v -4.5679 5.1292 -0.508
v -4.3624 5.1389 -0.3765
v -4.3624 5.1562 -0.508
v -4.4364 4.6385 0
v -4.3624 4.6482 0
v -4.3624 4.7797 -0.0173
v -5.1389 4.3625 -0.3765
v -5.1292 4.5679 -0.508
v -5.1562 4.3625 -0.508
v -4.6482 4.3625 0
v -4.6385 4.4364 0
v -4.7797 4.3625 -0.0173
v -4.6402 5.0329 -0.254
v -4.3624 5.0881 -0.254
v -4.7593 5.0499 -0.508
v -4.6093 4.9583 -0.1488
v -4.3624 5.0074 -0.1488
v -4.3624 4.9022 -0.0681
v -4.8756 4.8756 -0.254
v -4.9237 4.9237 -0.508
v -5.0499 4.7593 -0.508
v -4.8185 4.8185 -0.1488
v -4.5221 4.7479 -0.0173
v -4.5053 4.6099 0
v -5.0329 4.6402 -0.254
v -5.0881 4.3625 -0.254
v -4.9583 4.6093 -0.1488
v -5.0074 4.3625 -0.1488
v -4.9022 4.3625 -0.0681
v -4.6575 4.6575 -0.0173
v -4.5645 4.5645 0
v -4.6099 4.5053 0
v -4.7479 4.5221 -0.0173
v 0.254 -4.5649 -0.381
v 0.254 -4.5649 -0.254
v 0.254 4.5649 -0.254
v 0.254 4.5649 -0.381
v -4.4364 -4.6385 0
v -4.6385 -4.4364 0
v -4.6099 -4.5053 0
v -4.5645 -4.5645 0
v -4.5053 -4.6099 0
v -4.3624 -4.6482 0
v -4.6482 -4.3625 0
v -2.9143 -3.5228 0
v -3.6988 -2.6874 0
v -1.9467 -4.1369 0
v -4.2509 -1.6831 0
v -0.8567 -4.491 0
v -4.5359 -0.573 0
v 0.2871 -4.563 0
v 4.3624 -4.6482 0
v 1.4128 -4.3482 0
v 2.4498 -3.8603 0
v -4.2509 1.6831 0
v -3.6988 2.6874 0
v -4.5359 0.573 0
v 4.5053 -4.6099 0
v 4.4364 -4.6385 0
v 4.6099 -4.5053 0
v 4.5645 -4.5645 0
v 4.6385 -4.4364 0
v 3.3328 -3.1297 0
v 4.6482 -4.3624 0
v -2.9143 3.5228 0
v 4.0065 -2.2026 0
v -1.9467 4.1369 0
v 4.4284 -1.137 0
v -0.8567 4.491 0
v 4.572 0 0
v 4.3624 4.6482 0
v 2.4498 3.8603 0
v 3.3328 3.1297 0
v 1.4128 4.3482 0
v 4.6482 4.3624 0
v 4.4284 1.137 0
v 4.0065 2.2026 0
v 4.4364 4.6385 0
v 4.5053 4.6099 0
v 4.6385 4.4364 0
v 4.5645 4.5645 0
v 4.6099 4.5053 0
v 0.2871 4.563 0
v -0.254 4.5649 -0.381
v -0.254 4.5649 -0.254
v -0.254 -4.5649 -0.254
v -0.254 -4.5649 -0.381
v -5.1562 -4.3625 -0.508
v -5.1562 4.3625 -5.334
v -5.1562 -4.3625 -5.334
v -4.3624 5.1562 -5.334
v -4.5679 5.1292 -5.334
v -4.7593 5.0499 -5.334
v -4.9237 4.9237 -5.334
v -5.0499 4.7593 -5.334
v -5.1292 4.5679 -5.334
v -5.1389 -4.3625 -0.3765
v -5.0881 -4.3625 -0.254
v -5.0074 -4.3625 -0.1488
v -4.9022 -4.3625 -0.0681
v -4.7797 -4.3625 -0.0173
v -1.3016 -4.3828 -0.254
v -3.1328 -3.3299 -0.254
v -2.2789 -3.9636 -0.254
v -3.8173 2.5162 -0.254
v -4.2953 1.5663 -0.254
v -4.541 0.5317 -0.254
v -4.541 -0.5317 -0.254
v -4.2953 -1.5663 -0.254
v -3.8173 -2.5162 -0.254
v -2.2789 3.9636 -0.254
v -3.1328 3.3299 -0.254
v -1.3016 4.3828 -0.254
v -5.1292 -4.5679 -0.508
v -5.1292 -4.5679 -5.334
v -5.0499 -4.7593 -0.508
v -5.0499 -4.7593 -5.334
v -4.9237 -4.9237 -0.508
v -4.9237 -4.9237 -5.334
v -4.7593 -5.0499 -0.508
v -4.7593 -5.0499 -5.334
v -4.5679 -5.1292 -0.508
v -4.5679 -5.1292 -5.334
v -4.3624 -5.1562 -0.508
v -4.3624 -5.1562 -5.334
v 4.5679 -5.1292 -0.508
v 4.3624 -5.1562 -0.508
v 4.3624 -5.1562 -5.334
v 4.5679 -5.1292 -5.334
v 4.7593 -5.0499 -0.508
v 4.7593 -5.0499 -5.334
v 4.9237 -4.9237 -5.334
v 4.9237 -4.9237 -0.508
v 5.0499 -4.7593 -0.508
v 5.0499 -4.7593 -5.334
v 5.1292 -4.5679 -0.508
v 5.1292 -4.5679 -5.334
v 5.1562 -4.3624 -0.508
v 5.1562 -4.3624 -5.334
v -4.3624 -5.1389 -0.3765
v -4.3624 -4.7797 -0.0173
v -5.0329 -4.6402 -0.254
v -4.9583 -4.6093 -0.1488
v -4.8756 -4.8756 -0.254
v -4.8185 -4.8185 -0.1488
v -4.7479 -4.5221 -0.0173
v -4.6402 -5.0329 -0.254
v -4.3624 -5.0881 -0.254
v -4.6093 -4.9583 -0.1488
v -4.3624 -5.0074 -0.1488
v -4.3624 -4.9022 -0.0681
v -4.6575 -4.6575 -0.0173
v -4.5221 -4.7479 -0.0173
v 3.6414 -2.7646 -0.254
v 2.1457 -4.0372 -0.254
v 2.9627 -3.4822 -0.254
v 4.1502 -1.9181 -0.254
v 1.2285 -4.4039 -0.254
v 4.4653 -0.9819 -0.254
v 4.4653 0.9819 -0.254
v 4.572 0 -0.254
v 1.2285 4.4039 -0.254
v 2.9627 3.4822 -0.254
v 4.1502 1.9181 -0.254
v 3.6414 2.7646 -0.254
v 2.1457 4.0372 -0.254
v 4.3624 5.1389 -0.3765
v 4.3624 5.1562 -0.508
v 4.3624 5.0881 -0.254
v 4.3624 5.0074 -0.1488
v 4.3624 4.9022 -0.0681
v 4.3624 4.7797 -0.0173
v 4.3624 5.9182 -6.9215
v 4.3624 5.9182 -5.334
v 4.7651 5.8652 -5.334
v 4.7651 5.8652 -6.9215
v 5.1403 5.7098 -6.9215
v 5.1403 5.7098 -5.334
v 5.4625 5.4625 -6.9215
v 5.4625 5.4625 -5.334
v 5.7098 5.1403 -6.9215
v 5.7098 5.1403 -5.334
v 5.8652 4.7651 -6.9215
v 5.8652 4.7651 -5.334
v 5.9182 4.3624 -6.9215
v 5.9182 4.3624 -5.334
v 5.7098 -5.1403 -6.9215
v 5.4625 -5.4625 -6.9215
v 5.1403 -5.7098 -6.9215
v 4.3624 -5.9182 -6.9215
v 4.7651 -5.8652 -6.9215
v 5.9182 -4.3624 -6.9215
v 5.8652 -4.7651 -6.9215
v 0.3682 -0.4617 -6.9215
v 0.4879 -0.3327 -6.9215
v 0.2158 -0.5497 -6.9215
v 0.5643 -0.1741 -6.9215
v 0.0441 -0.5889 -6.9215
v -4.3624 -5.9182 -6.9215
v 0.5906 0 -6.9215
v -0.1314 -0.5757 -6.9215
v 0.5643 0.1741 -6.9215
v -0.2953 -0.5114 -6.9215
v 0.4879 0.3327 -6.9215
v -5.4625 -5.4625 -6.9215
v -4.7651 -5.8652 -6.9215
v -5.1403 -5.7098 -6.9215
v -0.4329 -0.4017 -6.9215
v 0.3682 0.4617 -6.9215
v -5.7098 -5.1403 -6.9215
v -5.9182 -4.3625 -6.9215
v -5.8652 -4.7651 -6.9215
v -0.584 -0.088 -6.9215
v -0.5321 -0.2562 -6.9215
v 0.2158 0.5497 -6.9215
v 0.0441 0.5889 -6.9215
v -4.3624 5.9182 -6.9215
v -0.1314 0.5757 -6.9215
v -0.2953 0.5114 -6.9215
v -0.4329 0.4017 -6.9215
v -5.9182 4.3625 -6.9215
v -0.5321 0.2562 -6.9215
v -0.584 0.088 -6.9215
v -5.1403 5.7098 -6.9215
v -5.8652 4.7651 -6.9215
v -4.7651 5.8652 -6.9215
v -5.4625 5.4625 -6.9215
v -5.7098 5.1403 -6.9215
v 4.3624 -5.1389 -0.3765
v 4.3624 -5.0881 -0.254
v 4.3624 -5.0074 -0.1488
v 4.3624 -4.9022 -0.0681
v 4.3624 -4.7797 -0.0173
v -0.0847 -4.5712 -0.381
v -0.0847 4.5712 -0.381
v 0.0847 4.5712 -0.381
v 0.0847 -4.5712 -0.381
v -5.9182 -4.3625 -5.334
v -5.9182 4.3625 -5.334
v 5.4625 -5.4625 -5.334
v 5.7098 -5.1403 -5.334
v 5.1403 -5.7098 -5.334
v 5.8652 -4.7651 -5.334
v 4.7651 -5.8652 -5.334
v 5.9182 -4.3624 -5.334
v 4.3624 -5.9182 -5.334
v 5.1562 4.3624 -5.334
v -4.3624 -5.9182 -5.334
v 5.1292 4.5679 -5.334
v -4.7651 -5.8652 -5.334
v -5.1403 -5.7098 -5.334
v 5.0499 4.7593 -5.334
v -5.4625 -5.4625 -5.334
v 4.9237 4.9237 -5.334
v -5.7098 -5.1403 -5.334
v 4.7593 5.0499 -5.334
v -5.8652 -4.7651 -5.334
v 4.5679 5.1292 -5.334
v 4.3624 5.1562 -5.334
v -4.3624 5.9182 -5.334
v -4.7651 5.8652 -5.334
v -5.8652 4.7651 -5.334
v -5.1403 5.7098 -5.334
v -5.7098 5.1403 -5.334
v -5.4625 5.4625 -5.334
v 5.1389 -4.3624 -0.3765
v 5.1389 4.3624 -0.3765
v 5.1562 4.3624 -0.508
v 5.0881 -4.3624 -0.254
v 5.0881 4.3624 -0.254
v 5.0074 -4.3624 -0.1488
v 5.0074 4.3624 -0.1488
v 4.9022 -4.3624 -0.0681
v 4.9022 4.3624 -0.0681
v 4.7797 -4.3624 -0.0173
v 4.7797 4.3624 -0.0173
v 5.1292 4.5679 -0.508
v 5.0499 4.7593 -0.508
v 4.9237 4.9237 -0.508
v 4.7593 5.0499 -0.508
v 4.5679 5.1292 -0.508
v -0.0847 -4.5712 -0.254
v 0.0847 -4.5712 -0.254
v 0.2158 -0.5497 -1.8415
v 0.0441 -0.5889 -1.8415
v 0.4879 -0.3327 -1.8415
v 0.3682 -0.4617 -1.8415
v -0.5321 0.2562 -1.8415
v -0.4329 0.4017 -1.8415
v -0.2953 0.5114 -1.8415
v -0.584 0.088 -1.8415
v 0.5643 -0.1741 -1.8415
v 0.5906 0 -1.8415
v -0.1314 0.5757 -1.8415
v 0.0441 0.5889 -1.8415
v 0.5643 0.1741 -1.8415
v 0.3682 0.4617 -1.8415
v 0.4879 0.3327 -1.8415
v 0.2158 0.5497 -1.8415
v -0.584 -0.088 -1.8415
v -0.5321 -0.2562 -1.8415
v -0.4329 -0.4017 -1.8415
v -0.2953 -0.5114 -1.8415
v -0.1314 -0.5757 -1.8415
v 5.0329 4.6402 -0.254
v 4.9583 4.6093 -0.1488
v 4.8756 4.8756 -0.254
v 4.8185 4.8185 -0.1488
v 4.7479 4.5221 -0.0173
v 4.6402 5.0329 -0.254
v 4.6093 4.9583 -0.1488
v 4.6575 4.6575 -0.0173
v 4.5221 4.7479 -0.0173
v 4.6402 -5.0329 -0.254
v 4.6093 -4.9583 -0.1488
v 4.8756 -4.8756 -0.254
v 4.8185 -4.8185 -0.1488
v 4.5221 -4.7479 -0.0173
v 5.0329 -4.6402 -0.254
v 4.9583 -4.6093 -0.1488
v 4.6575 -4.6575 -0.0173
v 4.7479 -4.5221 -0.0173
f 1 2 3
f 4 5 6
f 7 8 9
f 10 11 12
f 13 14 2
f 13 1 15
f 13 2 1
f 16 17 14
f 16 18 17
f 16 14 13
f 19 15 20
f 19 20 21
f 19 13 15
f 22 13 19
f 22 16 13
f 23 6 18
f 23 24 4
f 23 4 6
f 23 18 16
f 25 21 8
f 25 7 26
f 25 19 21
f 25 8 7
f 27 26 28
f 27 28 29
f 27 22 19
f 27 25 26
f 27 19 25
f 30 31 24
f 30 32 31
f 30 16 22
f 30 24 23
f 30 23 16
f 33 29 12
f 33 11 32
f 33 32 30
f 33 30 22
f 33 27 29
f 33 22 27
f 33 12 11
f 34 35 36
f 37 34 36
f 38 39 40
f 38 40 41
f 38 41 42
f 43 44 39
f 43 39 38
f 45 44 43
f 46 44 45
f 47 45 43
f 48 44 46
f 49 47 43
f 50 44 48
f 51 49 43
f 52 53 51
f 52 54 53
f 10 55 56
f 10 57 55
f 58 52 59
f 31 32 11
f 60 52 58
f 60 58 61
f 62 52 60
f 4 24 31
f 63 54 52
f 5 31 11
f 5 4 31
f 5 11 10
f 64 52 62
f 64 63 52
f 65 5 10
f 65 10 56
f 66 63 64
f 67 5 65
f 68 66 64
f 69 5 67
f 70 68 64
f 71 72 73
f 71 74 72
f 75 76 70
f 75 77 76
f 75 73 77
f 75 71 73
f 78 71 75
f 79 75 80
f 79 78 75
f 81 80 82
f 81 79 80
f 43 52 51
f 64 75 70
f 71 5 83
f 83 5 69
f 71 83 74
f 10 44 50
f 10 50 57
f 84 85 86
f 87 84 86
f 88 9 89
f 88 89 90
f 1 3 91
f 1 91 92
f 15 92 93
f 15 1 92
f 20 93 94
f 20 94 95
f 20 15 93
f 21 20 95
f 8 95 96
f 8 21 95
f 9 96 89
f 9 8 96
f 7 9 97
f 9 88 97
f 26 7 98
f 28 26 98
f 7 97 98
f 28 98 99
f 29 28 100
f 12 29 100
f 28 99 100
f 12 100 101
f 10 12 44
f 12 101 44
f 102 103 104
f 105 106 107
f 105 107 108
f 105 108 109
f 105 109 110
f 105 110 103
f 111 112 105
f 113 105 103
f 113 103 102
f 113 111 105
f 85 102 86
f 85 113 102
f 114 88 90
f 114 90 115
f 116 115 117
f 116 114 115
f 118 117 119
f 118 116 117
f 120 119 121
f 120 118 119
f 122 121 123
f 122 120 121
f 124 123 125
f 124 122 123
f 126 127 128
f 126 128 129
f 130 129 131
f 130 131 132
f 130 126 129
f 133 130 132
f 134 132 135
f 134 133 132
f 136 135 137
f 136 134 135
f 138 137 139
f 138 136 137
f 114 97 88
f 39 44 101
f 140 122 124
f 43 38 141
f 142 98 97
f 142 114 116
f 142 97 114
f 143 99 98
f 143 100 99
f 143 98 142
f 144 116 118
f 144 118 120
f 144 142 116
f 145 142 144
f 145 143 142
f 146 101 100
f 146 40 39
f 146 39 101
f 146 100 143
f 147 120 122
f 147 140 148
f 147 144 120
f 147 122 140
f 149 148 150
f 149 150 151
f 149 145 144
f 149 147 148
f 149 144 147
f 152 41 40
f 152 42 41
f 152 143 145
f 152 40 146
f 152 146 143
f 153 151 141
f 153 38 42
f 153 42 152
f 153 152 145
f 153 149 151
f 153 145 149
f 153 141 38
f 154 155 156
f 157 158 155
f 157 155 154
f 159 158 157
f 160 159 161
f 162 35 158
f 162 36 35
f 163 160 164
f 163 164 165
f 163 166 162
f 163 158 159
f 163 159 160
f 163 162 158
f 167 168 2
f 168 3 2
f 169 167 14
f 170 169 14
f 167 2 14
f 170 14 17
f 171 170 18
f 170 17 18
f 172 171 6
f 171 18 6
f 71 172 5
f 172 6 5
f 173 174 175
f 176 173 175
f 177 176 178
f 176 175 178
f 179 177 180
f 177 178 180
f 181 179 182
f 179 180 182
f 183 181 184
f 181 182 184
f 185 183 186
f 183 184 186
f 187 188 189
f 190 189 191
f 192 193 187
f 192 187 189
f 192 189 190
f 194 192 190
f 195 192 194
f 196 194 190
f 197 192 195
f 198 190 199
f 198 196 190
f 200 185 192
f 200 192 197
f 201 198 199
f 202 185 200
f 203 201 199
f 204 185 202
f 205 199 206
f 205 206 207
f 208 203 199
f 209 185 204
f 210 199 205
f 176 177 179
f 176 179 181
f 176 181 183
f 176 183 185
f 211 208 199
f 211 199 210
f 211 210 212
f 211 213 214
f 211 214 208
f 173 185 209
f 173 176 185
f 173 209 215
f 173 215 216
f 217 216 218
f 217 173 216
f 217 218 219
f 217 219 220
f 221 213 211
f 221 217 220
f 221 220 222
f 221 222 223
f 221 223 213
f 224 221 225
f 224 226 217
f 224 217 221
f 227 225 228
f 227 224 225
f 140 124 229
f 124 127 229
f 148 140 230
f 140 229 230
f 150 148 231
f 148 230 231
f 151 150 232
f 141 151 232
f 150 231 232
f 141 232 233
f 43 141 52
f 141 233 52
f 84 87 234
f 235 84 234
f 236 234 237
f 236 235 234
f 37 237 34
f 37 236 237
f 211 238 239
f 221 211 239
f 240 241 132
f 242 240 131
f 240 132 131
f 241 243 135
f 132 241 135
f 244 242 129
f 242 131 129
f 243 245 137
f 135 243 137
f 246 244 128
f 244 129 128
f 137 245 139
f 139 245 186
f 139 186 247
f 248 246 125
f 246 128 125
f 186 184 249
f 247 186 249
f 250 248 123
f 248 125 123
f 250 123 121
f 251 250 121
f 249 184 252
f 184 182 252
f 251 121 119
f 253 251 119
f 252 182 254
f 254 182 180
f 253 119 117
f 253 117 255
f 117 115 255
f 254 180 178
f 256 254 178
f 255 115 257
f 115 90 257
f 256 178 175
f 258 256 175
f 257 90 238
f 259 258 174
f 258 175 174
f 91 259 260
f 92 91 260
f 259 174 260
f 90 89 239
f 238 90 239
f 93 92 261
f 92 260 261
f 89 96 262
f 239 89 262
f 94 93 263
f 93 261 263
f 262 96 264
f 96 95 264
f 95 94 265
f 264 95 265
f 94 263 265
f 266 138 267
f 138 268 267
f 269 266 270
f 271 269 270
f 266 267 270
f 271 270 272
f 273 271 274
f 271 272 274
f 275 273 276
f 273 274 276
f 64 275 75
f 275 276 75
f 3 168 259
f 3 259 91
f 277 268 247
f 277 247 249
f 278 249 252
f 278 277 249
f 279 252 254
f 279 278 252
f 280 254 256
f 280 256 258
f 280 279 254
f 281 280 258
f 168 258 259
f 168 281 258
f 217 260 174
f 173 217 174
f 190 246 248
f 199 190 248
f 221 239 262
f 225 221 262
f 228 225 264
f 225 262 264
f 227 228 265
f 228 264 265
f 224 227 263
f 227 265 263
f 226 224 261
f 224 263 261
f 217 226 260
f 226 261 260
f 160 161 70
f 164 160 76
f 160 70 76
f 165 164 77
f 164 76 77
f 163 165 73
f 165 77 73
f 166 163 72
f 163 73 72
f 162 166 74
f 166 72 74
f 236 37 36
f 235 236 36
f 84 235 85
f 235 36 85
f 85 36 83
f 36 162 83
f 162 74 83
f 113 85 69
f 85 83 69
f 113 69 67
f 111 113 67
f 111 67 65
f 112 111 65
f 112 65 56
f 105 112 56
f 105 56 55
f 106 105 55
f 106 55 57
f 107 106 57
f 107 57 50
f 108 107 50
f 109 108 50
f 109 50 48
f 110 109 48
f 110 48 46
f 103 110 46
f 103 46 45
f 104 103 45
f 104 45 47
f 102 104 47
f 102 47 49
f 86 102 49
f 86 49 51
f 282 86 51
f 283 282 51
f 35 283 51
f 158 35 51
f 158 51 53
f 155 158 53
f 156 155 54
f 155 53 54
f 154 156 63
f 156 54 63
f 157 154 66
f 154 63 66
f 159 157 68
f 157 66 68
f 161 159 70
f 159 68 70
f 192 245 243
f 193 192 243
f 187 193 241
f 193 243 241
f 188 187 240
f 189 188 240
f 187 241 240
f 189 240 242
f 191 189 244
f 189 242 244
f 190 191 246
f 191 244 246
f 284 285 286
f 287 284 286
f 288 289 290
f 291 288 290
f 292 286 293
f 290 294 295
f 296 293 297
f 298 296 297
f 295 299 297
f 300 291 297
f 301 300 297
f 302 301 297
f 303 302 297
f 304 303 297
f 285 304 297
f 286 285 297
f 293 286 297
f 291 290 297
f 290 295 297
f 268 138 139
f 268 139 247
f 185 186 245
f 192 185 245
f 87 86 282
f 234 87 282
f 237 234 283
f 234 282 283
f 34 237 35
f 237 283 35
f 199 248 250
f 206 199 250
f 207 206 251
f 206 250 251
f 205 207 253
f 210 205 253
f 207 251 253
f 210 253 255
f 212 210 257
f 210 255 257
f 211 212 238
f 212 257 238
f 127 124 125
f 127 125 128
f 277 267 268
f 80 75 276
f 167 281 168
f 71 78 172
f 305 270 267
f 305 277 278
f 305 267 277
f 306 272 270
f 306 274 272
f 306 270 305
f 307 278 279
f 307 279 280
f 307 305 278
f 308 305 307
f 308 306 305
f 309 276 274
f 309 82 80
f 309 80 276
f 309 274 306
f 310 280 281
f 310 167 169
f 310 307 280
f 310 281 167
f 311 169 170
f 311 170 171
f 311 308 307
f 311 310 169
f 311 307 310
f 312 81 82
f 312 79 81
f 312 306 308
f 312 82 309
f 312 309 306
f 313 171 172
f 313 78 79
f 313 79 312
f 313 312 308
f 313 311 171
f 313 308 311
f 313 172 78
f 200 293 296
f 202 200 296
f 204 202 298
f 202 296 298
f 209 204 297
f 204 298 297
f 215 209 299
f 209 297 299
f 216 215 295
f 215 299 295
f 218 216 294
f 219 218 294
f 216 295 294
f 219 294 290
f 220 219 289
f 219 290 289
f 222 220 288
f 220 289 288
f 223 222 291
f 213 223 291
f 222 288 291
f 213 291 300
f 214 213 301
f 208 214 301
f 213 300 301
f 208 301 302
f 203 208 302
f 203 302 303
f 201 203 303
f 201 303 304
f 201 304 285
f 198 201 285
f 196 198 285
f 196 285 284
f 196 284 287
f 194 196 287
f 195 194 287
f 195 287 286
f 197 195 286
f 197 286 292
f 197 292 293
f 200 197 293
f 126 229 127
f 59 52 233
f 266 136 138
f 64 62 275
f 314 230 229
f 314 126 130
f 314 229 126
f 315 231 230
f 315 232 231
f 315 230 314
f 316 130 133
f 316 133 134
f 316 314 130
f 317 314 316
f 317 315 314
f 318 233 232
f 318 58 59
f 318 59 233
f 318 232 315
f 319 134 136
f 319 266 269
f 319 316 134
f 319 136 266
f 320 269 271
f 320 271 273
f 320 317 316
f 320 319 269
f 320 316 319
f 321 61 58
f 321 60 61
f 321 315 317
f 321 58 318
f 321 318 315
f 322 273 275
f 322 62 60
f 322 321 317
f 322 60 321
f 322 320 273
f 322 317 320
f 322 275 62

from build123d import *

# Parameters (mm, degrees)
BOSS_EXTRUDE1_DEPTH              = 5.334
FILLET1_R                        = 0.508
SKETCH2_R                        = 4.572
CUT_EXTRUDE1_DEPTH               = 0.254
CUT_EXTRUDE2_DEPTH               = 0.127
BOSS_EXTRUDE2_DEPTH              = 1.5875
F_56_0_0465_DIAMETER_HOLE1_D     = 1.1811
F_56_0_0465_DIAMETER_HOLE1_DEPTH = 5.08


with BuildPart() as part:
    # Sketch1 → Boss-Extrude1 (new body)
    with BuildSketch(Plane.XY):
        with BuildLine():
            Line((4.362446893, 5.156199954), (-4.362446893, 5.156199954))
            ThreePointArc((-4.362446893, 5.156199954), (-4.923713797, 4.923718126), (-5.156199954, 4.362453015))
            Line((-5.156199954, 4.362453015), (-5.156199954, -4.362453015))
            ThreePointArc((-5.156199954, -4.362453015), (-4.923714856, -4.923717067), (-4.362449887, -5.156199954))
            Line((-4.362449887, -5.156199954), (4.362449887, -5.156199954))
            ThreePointArc((4.362449887, -5.156199954), (4.92371702, -4.923714903), (5.156199954, -4.362446893))
            Line((5.156199954, -4.362446893), (5.156199954, 4.362446893))
            ThreePointArc((5.156199954, 4.362446893), (4.923715961, 4.923715962), (4.362446893, 5.156199954))
        make_face()
    extrude(amount=-BOSS_EXTRUDE1_DEPTH)

    # Fillet1
    fillet1_edges = [part.edges().sort_by_distance(p)[0] for p in [
        (0, 5.156199954, 0),
        (4.923715961, 4.923715962, 0),
        (5.156199954, 0, 0),
        (4.92371702, -4.923714903, 0),
        (0, -5.156199954, 0),
        (-4.923714856, -4.923717067, 0),
        (-5.156199954, 0, 0),
        (-4.923713797, 4.923718126, 0),
    ]]
    fillet(fillet1_edges, radius=FILLET1_R)

    # Sketch2 → Cut-Extrude1 (cut)
    with BuildSketch(Plane.XY):
        Circle(SKETCH2_R)
    extrude(amount=-CUT_EXTRUDE1_DEPTH, mode=Mode.SUBTRACT)

    # Sketch3 → Cut-Extrude2 (cut)
    with BuildSketch(Plane.XY.offset(-0.254)):
        with BuildLine():
            Line((-0.254, 4.564938992), (-0.254, -4.564938992))
            ThreePointArc((-0.254, -4.564938992), (0, -4.572), (0.254, -4.564938992))
            Line((0.254, -4.564938992), (0.254, 4.564938992))
            ThreePointArc((0.254, 4.564938992), (0, 4.572), (-0.254, 4.564938992))
        make_face()
    extrude(amount=-CUT_EXTRUDE2_DEPTH, mode=Mode.SUBTRACT)

    # Sketch4 → Boss-Extrude2 (add)
    with BuildSketch(Plane(origin=(0, 0, -5.334), x_dir=(-1, 0, 0), z_dir=(0, 0, -1))):
        with BuildLine():
            Line((-5.918199954, 4.362443955), (-5.918199954, -4.362446893))
            ThreePointArc((-5.918199954, -4.362446893), (-5.462532364, -5.462530293), (-4.362449822, -5.918199954))
            Line((-4.362449822, -5.918199954), (4.362449887, -5.918199954))
            ThreePointArc((4.362449887, -5.918199954), (5.462529184, -5.462533474), (5.918199954, -4.362455953))
            Line((5.918199954, -4.362455953), (5.918199954, 4.362453015))
            ThreePointArc((5.918199954, 4.362453015), (5.462528126, 5.462534532), (4.362443955, 5.918199954))
            Line((4.362443955, 5.918199954), (-4.362443955, 5.918199954))
            ThreePointArc((-4.362443955, 5.918199954), (-5.462531329, 5.462531329), (-5.918199954, 4.362443955))
        make_face()
    extrude(amount=BOSS_EXTRUDE2_DEPTH)

    # #56 (0.0465) Diameter Hole1
    with Locations(Plane(origin=(0, 0, -6.9215), x_dir=(-1, 0, 0), z_dir=(0, 0, -1))):
        with Locations((0, 0)):
            Hole(F_56_0_0465_DIAMETER_HOLE1_D / 2, depth=F_56_0_0465_DIAMETER_HOLE1_DEPTH)


solid = part.part
